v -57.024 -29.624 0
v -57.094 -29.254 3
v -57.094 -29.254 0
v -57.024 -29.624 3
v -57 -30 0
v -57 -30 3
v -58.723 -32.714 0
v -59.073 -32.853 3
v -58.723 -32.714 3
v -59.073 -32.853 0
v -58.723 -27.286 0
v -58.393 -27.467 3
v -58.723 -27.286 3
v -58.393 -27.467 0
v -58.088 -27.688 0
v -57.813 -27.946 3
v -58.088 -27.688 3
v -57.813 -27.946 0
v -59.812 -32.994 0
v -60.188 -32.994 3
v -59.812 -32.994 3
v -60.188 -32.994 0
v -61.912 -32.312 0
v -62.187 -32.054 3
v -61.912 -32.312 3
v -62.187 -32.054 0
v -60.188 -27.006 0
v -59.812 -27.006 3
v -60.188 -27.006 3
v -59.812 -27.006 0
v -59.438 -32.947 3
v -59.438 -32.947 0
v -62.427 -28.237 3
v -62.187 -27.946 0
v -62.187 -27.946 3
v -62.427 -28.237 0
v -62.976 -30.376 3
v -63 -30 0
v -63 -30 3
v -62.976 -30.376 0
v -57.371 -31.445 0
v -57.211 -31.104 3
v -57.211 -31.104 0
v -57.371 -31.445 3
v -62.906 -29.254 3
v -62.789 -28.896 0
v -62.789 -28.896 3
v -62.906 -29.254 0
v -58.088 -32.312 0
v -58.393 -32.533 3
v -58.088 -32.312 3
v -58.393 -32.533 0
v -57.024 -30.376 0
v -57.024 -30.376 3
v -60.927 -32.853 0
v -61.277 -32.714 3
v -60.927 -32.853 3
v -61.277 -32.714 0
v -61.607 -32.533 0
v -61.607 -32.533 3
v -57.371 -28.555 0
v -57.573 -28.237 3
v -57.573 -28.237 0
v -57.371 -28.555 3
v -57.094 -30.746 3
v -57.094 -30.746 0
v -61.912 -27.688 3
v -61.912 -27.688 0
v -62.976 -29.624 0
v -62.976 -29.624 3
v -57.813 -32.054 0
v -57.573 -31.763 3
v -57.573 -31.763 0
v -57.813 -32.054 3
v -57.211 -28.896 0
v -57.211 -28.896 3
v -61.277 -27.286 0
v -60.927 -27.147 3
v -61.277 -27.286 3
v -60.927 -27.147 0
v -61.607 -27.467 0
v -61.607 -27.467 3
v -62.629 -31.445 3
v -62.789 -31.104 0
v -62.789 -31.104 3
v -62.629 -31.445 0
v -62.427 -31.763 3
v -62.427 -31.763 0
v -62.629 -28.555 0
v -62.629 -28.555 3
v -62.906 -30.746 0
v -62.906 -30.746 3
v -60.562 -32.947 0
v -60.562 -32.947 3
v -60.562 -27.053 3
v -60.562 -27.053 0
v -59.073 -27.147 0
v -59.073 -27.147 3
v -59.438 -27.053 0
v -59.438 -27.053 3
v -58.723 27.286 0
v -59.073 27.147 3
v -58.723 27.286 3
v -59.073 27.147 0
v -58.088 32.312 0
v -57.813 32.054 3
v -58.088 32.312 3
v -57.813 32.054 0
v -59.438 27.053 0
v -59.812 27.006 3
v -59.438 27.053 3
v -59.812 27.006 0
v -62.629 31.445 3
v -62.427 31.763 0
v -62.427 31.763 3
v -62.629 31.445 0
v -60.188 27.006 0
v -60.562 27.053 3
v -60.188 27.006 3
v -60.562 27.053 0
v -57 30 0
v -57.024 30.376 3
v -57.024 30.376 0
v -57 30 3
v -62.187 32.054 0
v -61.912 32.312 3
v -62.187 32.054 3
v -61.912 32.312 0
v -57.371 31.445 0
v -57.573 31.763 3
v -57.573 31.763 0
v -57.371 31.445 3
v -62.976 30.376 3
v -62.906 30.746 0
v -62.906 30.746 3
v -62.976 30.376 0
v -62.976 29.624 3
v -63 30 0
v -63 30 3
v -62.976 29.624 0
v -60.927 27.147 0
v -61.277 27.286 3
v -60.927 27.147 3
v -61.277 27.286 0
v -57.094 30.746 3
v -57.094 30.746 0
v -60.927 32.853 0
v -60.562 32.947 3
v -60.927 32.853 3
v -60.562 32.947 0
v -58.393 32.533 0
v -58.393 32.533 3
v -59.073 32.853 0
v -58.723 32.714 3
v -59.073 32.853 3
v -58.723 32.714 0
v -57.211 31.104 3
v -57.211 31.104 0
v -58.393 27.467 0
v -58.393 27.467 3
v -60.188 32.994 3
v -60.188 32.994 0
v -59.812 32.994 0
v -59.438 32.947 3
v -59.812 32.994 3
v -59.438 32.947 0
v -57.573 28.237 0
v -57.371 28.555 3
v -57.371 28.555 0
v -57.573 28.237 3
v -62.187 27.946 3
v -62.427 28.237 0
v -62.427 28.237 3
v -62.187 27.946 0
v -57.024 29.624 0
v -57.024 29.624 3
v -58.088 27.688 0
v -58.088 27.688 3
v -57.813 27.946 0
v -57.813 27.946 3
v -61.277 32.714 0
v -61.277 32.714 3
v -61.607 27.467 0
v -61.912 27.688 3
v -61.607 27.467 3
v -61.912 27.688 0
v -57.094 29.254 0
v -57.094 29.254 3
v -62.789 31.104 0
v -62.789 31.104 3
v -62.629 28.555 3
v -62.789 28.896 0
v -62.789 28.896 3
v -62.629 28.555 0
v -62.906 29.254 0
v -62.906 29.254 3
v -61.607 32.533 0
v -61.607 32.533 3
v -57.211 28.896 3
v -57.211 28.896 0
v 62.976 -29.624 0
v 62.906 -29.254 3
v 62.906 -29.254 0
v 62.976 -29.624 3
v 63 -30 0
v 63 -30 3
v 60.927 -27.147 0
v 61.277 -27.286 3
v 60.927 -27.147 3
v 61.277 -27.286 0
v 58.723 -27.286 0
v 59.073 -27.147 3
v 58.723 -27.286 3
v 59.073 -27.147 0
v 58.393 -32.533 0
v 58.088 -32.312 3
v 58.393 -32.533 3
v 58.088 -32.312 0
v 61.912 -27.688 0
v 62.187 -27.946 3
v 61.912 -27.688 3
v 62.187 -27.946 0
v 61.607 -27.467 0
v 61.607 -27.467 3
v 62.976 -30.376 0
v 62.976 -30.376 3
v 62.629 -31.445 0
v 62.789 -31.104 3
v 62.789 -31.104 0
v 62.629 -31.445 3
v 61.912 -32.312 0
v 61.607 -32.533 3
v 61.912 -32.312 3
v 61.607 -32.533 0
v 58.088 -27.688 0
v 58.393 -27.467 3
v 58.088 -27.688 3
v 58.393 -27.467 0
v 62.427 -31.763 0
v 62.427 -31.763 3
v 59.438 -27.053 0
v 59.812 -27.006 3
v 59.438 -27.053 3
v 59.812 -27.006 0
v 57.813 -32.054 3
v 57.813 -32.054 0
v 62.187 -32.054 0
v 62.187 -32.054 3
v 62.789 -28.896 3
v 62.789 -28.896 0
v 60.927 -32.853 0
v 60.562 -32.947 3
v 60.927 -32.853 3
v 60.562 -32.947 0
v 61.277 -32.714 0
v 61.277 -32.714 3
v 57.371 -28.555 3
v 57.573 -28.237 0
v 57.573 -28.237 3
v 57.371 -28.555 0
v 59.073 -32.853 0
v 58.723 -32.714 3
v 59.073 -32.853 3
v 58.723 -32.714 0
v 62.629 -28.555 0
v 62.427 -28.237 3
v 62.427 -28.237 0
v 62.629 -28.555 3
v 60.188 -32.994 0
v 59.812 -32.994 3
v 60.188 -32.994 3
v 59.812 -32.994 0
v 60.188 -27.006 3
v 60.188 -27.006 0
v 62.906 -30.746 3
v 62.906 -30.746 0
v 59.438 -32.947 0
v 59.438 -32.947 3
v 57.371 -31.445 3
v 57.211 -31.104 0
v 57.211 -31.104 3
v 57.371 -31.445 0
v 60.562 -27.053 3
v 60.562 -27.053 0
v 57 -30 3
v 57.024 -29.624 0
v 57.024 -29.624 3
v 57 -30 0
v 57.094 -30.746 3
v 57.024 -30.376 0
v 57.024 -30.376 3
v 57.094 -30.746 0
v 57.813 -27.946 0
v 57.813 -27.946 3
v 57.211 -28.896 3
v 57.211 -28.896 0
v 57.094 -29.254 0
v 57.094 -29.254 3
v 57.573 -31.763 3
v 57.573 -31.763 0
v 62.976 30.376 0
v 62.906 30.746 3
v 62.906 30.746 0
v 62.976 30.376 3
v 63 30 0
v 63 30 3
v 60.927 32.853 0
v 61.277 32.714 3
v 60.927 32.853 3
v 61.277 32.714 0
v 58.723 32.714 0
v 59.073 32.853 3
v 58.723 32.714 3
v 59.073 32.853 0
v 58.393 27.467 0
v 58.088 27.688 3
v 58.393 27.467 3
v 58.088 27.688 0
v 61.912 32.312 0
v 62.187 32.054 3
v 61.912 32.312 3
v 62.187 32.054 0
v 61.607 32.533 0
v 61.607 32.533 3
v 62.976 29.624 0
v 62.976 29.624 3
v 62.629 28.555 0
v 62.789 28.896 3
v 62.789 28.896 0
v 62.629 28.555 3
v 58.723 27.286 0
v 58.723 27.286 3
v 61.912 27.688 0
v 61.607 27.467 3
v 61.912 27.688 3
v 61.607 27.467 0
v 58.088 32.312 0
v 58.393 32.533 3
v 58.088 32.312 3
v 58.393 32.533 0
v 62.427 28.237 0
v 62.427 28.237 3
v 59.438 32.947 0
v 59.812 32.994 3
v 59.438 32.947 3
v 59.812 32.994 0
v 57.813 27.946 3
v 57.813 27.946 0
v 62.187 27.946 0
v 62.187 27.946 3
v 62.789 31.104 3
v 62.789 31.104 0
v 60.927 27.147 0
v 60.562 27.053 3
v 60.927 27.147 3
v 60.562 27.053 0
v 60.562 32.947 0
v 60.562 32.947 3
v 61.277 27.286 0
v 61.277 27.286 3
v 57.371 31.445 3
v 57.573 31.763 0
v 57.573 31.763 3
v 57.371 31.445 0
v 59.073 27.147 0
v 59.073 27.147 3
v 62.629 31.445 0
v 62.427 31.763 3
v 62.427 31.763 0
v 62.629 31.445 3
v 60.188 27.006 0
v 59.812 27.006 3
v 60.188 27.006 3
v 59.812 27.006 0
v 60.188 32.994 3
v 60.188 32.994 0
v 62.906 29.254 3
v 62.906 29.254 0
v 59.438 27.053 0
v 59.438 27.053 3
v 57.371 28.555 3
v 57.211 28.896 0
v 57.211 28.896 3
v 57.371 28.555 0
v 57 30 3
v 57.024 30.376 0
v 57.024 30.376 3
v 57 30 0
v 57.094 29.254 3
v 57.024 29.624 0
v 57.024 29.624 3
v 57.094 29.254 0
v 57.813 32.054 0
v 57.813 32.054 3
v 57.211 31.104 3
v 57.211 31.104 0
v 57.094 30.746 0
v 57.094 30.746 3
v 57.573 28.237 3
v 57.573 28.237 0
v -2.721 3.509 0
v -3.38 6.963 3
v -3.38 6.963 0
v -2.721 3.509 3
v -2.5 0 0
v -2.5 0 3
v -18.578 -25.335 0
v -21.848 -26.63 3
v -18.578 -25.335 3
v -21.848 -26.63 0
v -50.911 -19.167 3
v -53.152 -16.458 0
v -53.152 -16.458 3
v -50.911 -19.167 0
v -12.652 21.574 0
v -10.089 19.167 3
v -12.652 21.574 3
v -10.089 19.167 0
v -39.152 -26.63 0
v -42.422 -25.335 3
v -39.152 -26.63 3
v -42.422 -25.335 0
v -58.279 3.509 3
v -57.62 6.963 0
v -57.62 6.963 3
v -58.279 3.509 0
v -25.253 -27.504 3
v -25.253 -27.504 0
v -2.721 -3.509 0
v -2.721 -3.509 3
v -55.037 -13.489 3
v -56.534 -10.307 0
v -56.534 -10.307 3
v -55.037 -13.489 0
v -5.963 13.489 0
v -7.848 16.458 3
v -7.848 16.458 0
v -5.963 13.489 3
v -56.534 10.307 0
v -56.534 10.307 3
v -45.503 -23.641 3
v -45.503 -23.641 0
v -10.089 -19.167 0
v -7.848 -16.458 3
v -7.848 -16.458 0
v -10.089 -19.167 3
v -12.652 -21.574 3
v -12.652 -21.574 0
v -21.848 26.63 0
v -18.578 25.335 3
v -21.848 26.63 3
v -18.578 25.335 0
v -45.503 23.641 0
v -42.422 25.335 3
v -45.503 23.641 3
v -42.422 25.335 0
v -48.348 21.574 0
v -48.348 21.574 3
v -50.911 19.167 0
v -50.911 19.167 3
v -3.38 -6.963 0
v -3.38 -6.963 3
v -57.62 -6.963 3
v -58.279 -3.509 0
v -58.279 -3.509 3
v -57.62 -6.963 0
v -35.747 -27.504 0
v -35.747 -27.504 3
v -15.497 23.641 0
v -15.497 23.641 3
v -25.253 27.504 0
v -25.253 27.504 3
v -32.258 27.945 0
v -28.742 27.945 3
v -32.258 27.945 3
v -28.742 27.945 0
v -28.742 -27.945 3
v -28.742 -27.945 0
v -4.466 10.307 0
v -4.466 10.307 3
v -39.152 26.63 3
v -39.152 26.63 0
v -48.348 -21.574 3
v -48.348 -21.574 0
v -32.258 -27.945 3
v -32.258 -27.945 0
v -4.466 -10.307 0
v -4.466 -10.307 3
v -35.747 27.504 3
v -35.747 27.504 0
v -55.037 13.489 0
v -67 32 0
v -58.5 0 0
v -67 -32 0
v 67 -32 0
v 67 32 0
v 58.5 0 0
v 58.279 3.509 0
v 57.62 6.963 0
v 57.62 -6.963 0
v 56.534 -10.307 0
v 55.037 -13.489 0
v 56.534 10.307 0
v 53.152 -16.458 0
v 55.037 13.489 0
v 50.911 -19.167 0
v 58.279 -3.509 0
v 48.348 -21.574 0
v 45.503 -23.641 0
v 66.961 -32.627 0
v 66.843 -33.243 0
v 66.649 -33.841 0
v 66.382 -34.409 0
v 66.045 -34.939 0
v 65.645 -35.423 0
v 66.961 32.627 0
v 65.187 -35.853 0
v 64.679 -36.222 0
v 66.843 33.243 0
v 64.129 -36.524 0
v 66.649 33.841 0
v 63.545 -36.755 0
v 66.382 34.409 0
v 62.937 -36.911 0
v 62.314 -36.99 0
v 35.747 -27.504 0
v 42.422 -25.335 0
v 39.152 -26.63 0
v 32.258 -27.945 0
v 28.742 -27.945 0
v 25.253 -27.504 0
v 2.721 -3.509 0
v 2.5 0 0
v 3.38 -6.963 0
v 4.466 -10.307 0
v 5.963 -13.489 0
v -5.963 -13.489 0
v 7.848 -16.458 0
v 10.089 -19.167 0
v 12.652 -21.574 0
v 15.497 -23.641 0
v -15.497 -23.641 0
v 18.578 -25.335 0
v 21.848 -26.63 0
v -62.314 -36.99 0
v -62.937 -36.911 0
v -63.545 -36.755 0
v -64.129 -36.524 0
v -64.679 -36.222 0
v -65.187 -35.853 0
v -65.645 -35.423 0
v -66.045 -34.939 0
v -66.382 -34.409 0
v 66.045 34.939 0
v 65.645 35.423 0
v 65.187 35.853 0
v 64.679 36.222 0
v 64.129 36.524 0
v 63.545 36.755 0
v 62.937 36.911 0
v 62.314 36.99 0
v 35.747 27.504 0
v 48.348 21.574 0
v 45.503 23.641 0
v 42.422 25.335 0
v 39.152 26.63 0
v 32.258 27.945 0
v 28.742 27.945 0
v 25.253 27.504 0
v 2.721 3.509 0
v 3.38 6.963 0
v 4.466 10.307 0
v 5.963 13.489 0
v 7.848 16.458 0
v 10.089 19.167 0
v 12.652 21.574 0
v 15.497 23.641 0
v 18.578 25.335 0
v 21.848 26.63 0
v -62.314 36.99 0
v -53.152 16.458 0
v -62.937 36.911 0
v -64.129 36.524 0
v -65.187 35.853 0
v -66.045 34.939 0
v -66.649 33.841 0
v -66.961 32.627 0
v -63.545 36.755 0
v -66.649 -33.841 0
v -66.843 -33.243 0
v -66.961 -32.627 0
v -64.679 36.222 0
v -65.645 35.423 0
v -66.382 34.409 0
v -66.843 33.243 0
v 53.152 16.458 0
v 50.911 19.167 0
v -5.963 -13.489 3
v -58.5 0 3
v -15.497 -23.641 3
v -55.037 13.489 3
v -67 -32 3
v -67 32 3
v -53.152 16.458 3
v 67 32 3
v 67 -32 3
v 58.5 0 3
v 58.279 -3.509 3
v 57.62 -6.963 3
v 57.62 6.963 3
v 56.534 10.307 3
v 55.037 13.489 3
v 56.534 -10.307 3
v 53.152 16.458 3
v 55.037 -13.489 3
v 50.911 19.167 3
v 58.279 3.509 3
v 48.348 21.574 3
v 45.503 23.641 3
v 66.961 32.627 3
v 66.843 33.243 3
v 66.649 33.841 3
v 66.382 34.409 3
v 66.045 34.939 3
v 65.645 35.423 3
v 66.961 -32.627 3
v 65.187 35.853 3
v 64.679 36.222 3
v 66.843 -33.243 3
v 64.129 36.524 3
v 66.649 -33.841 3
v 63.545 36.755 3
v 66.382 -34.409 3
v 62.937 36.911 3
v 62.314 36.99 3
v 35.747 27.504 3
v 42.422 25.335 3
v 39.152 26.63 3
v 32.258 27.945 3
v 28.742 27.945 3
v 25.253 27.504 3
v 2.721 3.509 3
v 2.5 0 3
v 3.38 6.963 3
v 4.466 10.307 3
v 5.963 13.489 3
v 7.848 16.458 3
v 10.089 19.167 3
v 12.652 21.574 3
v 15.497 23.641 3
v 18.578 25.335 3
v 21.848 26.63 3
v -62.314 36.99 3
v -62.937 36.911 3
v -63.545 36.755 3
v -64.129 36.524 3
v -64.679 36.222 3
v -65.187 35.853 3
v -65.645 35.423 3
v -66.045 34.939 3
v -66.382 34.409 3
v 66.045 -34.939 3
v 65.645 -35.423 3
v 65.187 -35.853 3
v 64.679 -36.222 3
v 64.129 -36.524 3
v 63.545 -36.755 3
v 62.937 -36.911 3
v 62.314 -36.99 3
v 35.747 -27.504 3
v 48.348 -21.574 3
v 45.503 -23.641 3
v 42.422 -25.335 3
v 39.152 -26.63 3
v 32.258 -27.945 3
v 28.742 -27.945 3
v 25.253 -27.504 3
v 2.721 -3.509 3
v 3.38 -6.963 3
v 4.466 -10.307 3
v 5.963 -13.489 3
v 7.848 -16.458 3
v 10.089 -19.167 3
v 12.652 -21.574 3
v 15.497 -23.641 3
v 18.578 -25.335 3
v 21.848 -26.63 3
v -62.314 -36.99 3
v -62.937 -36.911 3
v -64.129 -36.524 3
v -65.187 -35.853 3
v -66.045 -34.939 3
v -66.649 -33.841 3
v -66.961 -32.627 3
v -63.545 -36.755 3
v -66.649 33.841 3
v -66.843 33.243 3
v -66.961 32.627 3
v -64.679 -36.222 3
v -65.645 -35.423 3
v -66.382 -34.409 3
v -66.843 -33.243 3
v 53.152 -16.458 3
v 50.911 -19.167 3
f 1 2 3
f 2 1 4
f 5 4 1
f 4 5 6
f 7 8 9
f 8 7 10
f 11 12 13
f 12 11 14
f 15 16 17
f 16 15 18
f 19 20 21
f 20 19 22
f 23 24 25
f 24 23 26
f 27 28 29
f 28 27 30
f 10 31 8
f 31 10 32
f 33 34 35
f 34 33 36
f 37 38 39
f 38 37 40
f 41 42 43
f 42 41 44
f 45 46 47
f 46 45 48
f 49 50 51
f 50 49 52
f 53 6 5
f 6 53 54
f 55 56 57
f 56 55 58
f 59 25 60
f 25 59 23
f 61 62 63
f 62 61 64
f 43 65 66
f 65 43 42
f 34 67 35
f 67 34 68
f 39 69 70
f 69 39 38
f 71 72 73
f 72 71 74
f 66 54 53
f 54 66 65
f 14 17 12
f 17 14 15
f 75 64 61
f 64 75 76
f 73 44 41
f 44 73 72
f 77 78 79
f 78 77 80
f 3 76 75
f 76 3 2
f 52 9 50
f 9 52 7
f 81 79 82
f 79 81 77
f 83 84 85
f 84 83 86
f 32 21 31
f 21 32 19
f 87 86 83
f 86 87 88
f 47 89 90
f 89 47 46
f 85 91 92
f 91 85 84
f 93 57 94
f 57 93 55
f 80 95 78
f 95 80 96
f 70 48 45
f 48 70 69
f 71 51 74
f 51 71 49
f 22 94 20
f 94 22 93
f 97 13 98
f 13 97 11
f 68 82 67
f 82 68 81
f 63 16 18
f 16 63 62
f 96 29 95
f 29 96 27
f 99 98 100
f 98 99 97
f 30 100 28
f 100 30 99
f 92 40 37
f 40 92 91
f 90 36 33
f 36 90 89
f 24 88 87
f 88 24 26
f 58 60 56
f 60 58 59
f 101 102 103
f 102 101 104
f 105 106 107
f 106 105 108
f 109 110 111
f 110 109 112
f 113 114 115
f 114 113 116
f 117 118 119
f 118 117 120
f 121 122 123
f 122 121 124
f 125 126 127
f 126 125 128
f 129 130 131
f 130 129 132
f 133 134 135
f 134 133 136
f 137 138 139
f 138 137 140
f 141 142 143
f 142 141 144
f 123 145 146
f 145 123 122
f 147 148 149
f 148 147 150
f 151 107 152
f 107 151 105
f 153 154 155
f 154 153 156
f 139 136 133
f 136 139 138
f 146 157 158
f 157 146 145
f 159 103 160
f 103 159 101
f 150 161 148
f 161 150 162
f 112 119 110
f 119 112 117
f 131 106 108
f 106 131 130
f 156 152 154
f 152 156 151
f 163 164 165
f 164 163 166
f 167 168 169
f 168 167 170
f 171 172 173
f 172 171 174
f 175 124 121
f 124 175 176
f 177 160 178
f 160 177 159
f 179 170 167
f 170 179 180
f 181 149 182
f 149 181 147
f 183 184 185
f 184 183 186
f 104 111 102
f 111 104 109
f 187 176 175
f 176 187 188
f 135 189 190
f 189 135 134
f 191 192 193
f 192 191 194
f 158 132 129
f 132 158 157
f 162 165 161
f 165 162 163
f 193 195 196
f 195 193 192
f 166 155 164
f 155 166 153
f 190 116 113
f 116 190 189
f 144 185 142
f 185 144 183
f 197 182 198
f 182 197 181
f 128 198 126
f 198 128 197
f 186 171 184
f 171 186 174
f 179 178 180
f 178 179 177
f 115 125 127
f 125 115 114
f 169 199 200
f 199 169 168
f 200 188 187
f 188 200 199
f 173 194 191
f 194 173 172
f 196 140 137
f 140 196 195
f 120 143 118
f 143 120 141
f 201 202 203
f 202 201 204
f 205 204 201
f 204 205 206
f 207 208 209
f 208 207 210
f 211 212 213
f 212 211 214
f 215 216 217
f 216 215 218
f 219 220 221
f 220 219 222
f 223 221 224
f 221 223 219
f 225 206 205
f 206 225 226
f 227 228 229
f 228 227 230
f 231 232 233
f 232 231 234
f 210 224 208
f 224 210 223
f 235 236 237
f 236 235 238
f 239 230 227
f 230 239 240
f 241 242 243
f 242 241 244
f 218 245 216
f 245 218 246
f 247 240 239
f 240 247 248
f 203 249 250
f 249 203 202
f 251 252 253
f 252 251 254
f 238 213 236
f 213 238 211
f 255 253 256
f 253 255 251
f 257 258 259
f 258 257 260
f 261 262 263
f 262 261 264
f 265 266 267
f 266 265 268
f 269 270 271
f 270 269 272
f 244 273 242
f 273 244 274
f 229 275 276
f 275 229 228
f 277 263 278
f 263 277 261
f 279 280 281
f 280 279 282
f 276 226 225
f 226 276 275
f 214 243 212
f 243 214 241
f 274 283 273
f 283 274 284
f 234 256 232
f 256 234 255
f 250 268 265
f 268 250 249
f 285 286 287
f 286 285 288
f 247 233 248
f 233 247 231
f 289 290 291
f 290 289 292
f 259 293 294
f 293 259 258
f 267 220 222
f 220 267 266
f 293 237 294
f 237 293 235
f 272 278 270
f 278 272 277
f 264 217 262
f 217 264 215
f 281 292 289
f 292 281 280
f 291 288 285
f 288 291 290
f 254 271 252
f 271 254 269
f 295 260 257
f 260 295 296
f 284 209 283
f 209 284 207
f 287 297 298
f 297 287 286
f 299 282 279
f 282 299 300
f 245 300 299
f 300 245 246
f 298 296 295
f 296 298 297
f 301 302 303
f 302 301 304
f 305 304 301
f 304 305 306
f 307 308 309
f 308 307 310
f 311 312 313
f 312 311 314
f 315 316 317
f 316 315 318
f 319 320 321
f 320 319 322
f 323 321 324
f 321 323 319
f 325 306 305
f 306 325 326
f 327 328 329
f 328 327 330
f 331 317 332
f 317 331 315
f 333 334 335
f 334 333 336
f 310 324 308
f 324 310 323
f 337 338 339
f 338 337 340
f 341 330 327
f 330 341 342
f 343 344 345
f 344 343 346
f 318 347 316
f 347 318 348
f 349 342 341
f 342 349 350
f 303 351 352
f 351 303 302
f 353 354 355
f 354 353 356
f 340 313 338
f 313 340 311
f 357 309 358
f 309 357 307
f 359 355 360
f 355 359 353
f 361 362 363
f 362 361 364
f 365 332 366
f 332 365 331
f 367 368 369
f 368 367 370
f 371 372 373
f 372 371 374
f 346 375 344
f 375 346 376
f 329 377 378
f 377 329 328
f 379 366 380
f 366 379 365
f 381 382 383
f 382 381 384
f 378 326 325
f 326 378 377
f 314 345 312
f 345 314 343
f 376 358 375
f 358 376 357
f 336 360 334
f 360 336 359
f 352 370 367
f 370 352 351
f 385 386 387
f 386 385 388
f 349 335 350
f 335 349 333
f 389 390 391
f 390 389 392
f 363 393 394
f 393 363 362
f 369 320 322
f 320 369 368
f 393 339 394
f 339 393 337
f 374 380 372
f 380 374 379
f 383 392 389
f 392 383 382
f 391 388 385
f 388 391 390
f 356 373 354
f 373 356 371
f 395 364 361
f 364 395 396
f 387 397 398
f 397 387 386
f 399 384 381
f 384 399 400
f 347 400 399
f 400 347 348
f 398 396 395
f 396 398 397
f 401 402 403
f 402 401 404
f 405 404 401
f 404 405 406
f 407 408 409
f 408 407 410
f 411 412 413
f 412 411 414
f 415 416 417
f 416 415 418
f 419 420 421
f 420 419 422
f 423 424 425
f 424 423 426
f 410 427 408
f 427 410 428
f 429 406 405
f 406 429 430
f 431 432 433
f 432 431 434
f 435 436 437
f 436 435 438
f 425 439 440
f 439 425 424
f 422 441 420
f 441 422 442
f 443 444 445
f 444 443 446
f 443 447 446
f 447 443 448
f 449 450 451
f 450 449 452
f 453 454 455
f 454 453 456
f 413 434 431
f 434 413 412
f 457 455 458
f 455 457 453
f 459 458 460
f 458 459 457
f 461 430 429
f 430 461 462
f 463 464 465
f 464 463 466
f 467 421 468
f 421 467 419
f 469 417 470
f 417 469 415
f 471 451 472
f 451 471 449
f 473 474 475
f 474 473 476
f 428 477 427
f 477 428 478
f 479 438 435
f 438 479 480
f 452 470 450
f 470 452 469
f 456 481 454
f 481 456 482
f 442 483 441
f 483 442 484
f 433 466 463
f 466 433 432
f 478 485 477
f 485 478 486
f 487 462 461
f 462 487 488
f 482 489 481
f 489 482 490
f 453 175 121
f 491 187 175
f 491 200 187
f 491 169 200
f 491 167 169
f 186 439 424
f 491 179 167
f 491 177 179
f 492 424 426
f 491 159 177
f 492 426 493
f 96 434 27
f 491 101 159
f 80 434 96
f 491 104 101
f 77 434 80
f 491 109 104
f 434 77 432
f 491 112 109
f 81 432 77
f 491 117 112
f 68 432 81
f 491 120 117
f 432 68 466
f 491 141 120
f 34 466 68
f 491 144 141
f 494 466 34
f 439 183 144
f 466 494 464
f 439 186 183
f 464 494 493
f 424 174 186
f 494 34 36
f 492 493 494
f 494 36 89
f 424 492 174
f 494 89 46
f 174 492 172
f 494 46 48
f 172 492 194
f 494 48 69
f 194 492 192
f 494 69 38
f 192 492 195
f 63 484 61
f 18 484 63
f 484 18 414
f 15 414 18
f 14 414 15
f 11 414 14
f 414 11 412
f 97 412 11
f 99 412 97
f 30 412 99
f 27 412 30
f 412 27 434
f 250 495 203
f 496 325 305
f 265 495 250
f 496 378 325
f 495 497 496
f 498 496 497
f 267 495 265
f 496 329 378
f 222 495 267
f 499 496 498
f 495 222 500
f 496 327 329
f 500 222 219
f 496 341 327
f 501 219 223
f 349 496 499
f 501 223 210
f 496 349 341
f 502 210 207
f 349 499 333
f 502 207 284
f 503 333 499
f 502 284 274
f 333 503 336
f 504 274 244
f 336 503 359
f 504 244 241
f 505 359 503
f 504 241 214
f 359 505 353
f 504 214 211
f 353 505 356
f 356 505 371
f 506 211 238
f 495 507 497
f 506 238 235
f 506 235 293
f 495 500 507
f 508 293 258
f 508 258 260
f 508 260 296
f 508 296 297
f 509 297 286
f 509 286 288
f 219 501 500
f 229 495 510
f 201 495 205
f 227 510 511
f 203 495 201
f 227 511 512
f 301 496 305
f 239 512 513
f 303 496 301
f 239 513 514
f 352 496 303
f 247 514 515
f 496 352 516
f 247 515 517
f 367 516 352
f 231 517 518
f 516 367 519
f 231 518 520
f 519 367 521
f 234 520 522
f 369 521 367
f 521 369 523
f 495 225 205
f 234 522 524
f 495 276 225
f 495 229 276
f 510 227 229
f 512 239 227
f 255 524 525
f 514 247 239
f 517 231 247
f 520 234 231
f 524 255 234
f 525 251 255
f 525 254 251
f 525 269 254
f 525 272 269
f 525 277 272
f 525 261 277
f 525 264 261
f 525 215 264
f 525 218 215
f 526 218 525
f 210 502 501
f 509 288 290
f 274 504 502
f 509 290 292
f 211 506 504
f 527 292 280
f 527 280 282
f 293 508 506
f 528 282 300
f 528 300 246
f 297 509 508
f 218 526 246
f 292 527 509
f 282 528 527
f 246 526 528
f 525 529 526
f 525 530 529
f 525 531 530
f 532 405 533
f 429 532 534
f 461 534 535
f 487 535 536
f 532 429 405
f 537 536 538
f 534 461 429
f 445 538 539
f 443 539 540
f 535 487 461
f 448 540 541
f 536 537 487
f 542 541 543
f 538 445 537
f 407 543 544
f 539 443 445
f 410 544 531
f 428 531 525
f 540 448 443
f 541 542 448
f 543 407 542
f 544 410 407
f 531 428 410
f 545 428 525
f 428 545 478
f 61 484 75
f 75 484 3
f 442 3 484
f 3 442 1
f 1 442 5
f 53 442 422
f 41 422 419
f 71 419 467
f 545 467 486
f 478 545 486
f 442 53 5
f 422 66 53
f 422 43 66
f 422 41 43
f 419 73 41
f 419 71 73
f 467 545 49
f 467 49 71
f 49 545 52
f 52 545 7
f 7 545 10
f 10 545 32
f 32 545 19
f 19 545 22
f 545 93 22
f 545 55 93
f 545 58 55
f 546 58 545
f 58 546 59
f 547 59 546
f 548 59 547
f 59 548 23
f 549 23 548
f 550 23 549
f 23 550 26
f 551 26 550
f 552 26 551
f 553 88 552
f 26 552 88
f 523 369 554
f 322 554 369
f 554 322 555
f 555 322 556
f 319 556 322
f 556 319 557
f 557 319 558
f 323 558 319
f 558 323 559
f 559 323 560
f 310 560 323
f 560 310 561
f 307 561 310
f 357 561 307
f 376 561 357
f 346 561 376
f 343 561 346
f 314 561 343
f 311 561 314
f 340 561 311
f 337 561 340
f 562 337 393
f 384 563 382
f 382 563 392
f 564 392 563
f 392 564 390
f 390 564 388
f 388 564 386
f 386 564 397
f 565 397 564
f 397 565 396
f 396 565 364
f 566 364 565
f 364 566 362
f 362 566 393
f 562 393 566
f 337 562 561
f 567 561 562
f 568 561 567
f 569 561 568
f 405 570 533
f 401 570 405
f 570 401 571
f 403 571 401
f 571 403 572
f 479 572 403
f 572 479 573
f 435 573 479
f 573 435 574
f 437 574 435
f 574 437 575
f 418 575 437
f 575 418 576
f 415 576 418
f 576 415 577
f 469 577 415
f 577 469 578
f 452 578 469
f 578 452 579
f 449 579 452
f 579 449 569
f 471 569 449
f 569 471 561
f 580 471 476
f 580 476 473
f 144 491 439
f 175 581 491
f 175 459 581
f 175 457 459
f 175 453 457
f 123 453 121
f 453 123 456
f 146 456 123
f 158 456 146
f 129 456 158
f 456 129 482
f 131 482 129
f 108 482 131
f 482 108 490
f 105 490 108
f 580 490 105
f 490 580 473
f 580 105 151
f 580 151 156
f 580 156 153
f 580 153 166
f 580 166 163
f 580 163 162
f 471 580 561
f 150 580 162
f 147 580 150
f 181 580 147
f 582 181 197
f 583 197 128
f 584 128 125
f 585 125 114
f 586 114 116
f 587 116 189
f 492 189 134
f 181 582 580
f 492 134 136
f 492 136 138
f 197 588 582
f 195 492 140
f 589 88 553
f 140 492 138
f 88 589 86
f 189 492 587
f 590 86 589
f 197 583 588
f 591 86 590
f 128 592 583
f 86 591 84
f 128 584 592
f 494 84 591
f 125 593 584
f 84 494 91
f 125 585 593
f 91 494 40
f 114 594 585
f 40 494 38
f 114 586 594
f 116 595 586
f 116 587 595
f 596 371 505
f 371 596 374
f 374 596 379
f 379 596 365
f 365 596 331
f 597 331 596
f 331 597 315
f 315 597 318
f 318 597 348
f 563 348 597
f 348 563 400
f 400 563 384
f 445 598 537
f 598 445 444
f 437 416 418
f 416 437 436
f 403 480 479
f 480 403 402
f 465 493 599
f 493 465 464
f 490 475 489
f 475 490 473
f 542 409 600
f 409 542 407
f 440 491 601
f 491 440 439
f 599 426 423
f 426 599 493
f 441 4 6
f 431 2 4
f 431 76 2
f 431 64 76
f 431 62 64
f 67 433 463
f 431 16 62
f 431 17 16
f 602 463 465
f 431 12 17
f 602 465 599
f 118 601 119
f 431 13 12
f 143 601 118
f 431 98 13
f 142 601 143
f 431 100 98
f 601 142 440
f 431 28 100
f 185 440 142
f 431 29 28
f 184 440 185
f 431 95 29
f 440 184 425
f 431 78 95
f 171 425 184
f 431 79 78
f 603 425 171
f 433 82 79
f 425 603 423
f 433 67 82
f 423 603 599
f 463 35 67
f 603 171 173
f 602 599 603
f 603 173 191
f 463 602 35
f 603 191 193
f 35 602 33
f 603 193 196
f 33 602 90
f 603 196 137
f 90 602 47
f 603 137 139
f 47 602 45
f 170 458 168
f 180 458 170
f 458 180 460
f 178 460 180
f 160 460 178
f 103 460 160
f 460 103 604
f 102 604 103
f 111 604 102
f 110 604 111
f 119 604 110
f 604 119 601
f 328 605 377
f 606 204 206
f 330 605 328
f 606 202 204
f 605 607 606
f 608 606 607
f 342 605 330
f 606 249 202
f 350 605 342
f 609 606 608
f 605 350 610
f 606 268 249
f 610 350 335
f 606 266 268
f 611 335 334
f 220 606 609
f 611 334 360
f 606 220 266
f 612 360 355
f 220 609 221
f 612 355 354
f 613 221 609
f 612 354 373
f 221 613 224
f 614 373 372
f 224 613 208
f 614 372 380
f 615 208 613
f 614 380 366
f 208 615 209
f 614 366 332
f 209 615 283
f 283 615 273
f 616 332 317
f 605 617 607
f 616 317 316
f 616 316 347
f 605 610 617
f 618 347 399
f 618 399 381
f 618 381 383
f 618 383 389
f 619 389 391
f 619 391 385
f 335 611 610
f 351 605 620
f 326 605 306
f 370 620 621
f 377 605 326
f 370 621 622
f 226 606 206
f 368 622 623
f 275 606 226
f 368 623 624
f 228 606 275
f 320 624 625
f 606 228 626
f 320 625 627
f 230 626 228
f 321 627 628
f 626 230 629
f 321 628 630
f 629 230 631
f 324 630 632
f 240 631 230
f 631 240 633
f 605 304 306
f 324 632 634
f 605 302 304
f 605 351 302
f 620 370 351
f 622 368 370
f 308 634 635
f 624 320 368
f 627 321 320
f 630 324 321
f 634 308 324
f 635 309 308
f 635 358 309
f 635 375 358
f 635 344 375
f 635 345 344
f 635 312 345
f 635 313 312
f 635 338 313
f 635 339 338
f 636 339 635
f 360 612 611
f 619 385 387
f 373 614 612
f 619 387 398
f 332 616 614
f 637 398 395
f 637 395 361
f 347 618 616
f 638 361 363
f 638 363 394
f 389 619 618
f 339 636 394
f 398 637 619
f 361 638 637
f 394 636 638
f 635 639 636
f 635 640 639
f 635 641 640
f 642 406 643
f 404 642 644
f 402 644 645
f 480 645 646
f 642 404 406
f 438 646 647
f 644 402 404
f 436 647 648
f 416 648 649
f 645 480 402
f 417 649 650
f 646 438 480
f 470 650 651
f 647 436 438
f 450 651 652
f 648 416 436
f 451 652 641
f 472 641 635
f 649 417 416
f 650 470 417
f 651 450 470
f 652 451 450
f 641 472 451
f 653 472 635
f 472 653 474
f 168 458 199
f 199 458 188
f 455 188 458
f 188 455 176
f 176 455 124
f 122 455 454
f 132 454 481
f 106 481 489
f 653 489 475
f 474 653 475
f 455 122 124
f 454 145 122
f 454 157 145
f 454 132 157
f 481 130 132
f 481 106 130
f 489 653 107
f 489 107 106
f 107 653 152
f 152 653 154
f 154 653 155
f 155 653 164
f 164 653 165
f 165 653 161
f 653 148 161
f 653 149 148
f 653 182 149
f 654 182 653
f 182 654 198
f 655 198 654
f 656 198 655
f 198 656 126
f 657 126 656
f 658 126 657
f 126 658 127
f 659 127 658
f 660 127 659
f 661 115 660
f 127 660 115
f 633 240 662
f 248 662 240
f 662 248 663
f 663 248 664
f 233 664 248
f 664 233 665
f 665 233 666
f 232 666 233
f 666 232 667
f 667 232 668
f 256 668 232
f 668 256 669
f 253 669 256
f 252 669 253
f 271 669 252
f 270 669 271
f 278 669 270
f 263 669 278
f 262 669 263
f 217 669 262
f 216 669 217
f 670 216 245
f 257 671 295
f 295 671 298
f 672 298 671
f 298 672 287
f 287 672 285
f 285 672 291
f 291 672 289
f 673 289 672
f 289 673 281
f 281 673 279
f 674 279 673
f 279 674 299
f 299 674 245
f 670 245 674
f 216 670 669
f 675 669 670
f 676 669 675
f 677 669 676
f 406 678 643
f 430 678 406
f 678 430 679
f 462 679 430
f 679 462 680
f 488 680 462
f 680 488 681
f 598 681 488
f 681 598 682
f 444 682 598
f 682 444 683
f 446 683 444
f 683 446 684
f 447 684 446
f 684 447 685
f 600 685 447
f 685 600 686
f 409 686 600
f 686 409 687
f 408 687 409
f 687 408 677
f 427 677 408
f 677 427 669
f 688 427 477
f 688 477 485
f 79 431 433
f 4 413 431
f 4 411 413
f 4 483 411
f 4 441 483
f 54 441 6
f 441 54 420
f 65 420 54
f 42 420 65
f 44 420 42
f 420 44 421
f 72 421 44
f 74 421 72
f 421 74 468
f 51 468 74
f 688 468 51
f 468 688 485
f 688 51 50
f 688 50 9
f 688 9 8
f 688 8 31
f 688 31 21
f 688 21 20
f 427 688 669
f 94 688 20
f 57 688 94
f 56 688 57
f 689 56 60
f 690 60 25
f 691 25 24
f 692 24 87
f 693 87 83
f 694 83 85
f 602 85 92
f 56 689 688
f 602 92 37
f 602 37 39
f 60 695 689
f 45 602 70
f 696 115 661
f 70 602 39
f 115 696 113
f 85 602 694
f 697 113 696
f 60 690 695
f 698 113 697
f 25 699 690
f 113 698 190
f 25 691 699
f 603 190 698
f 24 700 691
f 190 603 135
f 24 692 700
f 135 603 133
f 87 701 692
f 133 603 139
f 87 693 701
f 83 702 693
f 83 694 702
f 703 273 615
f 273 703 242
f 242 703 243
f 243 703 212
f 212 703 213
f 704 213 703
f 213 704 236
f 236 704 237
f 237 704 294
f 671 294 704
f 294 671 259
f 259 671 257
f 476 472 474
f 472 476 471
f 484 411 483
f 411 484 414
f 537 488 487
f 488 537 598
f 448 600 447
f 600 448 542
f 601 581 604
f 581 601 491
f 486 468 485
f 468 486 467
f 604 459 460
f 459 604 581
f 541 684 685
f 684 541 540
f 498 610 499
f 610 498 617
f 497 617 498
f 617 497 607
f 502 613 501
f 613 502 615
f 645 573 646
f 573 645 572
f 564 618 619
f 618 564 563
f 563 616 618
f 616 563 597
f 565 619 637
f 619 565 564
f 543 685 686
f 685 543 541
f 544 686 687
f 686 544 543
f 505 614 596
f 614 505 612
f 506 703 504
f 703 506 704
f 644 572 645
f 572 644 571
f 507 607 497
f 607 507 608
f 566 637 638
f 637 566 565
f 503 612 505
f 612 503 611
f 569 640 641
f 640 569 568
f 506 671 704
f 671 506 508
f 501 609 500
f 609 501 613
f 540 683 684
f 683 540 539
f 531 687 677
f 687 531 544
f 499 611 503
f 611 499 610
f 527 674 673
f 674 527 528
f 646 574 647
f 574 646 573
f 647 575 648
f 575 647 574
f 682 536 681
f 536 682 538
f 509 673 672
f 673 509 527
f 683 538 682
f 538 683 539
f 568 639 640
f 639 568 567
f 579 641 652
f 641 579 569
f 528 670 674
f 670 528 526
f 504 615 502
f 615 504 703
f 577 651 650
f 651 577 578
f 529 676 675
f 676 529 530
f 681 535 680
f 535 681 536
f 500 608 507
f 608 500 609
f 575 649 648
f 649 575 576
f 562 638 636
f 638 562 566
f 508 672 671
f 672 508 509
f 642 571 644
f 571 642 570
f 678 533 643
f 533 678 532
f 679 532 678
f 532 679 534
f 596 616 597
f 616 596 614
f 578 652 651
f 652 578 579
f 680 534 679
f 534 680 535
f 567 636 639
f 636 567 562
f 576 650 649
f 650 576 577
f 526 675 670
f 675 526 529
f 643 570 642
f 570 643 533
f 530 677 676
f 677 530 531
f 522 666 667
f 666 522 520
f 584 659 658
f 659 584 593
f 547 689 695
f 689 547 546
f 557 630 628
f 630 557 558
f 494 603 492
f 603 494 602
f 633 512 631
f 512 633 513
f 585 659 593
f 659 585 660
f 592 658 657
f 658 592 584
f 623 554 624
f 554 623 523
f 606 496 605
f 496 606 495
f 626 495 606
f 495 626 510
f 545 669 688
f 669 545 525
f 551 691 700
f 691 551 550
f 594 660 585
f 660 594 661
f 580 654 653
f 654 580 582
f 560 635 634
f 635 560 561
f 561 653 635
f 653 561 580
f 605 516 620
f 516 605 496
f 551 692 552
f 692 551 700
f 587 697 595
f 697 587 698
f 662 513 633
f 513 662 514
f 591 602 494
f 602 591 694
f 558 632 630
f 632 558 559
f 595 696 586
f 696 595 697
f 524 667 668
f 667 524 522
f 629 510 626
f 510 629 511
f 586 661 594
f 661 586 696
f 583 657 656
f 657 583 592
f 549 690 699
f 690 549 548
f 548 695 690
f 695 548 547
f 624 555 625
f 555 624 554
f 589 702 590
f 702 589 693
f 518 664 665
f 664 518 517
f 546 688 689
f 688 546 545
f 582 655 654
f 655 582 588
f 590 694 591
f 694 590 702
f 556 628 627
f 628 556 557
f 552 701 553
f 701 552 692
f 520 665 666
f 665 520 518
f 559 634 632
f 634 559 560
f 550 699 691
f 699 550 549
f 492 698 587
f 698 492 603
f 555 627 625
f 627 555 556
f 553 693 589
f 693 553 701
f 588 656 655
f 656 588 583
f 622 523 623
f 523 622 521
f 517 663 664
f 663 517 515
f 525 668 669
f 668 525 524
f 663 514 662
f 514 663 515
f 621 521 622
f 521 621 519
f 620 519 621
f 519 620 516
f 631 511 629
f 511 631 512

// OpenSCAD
$fn = 50;


difference() {
	union() {
		hull() {
			translate(v = [-62.0000000000, 32.0000000000, 0]) {
				cylinder(h = 3, r = 5);
			}
			translate(v = [62.0000000000, 32.0000000000, 0]) {
				cylinder(h = 3, r = 5);
			}
			translate(v = [-62.0000000000, -32.0000000000, 0]) {
				cylinder(h = 3, r = 5);
			}
			translate(v = [62.0000000000, -32.0000000000, 0]) {
				cylinder(h = 3, r = 5);
			}
		}
	}
	union() {
		#translate(v = [-60.0000000000, -30.0000000000, -100.0000000000]) {
			cylinder(h = 200, r = 3.0000000000);
		}
		#translate(v = [-60.0000000000, 30.0000000000, -100.0000000000]) {
			cylinder(h = 200, r = 3.0000000000);
		}
		#translate(v = [60.0000000000, -30.0000000000, -100.0000000000]) {
			cylinder(h = 200, r = 3.0000000000);
		}
		#translate(v = [60.0000000000, 30.0000000000, -100.0000000000]) {
			cylinder(h = 200, r = 3.0000000000);
		}
		#translate(v = [-30.5000000000, 0, 0]) {
			cylinder(h = 3, r = 28.0000000000);
		}
		#translate(v = [30.5000000000, 0, 0]) {
			cylinder(h = 3, r = 28.0000000000);
		}
	}
}
